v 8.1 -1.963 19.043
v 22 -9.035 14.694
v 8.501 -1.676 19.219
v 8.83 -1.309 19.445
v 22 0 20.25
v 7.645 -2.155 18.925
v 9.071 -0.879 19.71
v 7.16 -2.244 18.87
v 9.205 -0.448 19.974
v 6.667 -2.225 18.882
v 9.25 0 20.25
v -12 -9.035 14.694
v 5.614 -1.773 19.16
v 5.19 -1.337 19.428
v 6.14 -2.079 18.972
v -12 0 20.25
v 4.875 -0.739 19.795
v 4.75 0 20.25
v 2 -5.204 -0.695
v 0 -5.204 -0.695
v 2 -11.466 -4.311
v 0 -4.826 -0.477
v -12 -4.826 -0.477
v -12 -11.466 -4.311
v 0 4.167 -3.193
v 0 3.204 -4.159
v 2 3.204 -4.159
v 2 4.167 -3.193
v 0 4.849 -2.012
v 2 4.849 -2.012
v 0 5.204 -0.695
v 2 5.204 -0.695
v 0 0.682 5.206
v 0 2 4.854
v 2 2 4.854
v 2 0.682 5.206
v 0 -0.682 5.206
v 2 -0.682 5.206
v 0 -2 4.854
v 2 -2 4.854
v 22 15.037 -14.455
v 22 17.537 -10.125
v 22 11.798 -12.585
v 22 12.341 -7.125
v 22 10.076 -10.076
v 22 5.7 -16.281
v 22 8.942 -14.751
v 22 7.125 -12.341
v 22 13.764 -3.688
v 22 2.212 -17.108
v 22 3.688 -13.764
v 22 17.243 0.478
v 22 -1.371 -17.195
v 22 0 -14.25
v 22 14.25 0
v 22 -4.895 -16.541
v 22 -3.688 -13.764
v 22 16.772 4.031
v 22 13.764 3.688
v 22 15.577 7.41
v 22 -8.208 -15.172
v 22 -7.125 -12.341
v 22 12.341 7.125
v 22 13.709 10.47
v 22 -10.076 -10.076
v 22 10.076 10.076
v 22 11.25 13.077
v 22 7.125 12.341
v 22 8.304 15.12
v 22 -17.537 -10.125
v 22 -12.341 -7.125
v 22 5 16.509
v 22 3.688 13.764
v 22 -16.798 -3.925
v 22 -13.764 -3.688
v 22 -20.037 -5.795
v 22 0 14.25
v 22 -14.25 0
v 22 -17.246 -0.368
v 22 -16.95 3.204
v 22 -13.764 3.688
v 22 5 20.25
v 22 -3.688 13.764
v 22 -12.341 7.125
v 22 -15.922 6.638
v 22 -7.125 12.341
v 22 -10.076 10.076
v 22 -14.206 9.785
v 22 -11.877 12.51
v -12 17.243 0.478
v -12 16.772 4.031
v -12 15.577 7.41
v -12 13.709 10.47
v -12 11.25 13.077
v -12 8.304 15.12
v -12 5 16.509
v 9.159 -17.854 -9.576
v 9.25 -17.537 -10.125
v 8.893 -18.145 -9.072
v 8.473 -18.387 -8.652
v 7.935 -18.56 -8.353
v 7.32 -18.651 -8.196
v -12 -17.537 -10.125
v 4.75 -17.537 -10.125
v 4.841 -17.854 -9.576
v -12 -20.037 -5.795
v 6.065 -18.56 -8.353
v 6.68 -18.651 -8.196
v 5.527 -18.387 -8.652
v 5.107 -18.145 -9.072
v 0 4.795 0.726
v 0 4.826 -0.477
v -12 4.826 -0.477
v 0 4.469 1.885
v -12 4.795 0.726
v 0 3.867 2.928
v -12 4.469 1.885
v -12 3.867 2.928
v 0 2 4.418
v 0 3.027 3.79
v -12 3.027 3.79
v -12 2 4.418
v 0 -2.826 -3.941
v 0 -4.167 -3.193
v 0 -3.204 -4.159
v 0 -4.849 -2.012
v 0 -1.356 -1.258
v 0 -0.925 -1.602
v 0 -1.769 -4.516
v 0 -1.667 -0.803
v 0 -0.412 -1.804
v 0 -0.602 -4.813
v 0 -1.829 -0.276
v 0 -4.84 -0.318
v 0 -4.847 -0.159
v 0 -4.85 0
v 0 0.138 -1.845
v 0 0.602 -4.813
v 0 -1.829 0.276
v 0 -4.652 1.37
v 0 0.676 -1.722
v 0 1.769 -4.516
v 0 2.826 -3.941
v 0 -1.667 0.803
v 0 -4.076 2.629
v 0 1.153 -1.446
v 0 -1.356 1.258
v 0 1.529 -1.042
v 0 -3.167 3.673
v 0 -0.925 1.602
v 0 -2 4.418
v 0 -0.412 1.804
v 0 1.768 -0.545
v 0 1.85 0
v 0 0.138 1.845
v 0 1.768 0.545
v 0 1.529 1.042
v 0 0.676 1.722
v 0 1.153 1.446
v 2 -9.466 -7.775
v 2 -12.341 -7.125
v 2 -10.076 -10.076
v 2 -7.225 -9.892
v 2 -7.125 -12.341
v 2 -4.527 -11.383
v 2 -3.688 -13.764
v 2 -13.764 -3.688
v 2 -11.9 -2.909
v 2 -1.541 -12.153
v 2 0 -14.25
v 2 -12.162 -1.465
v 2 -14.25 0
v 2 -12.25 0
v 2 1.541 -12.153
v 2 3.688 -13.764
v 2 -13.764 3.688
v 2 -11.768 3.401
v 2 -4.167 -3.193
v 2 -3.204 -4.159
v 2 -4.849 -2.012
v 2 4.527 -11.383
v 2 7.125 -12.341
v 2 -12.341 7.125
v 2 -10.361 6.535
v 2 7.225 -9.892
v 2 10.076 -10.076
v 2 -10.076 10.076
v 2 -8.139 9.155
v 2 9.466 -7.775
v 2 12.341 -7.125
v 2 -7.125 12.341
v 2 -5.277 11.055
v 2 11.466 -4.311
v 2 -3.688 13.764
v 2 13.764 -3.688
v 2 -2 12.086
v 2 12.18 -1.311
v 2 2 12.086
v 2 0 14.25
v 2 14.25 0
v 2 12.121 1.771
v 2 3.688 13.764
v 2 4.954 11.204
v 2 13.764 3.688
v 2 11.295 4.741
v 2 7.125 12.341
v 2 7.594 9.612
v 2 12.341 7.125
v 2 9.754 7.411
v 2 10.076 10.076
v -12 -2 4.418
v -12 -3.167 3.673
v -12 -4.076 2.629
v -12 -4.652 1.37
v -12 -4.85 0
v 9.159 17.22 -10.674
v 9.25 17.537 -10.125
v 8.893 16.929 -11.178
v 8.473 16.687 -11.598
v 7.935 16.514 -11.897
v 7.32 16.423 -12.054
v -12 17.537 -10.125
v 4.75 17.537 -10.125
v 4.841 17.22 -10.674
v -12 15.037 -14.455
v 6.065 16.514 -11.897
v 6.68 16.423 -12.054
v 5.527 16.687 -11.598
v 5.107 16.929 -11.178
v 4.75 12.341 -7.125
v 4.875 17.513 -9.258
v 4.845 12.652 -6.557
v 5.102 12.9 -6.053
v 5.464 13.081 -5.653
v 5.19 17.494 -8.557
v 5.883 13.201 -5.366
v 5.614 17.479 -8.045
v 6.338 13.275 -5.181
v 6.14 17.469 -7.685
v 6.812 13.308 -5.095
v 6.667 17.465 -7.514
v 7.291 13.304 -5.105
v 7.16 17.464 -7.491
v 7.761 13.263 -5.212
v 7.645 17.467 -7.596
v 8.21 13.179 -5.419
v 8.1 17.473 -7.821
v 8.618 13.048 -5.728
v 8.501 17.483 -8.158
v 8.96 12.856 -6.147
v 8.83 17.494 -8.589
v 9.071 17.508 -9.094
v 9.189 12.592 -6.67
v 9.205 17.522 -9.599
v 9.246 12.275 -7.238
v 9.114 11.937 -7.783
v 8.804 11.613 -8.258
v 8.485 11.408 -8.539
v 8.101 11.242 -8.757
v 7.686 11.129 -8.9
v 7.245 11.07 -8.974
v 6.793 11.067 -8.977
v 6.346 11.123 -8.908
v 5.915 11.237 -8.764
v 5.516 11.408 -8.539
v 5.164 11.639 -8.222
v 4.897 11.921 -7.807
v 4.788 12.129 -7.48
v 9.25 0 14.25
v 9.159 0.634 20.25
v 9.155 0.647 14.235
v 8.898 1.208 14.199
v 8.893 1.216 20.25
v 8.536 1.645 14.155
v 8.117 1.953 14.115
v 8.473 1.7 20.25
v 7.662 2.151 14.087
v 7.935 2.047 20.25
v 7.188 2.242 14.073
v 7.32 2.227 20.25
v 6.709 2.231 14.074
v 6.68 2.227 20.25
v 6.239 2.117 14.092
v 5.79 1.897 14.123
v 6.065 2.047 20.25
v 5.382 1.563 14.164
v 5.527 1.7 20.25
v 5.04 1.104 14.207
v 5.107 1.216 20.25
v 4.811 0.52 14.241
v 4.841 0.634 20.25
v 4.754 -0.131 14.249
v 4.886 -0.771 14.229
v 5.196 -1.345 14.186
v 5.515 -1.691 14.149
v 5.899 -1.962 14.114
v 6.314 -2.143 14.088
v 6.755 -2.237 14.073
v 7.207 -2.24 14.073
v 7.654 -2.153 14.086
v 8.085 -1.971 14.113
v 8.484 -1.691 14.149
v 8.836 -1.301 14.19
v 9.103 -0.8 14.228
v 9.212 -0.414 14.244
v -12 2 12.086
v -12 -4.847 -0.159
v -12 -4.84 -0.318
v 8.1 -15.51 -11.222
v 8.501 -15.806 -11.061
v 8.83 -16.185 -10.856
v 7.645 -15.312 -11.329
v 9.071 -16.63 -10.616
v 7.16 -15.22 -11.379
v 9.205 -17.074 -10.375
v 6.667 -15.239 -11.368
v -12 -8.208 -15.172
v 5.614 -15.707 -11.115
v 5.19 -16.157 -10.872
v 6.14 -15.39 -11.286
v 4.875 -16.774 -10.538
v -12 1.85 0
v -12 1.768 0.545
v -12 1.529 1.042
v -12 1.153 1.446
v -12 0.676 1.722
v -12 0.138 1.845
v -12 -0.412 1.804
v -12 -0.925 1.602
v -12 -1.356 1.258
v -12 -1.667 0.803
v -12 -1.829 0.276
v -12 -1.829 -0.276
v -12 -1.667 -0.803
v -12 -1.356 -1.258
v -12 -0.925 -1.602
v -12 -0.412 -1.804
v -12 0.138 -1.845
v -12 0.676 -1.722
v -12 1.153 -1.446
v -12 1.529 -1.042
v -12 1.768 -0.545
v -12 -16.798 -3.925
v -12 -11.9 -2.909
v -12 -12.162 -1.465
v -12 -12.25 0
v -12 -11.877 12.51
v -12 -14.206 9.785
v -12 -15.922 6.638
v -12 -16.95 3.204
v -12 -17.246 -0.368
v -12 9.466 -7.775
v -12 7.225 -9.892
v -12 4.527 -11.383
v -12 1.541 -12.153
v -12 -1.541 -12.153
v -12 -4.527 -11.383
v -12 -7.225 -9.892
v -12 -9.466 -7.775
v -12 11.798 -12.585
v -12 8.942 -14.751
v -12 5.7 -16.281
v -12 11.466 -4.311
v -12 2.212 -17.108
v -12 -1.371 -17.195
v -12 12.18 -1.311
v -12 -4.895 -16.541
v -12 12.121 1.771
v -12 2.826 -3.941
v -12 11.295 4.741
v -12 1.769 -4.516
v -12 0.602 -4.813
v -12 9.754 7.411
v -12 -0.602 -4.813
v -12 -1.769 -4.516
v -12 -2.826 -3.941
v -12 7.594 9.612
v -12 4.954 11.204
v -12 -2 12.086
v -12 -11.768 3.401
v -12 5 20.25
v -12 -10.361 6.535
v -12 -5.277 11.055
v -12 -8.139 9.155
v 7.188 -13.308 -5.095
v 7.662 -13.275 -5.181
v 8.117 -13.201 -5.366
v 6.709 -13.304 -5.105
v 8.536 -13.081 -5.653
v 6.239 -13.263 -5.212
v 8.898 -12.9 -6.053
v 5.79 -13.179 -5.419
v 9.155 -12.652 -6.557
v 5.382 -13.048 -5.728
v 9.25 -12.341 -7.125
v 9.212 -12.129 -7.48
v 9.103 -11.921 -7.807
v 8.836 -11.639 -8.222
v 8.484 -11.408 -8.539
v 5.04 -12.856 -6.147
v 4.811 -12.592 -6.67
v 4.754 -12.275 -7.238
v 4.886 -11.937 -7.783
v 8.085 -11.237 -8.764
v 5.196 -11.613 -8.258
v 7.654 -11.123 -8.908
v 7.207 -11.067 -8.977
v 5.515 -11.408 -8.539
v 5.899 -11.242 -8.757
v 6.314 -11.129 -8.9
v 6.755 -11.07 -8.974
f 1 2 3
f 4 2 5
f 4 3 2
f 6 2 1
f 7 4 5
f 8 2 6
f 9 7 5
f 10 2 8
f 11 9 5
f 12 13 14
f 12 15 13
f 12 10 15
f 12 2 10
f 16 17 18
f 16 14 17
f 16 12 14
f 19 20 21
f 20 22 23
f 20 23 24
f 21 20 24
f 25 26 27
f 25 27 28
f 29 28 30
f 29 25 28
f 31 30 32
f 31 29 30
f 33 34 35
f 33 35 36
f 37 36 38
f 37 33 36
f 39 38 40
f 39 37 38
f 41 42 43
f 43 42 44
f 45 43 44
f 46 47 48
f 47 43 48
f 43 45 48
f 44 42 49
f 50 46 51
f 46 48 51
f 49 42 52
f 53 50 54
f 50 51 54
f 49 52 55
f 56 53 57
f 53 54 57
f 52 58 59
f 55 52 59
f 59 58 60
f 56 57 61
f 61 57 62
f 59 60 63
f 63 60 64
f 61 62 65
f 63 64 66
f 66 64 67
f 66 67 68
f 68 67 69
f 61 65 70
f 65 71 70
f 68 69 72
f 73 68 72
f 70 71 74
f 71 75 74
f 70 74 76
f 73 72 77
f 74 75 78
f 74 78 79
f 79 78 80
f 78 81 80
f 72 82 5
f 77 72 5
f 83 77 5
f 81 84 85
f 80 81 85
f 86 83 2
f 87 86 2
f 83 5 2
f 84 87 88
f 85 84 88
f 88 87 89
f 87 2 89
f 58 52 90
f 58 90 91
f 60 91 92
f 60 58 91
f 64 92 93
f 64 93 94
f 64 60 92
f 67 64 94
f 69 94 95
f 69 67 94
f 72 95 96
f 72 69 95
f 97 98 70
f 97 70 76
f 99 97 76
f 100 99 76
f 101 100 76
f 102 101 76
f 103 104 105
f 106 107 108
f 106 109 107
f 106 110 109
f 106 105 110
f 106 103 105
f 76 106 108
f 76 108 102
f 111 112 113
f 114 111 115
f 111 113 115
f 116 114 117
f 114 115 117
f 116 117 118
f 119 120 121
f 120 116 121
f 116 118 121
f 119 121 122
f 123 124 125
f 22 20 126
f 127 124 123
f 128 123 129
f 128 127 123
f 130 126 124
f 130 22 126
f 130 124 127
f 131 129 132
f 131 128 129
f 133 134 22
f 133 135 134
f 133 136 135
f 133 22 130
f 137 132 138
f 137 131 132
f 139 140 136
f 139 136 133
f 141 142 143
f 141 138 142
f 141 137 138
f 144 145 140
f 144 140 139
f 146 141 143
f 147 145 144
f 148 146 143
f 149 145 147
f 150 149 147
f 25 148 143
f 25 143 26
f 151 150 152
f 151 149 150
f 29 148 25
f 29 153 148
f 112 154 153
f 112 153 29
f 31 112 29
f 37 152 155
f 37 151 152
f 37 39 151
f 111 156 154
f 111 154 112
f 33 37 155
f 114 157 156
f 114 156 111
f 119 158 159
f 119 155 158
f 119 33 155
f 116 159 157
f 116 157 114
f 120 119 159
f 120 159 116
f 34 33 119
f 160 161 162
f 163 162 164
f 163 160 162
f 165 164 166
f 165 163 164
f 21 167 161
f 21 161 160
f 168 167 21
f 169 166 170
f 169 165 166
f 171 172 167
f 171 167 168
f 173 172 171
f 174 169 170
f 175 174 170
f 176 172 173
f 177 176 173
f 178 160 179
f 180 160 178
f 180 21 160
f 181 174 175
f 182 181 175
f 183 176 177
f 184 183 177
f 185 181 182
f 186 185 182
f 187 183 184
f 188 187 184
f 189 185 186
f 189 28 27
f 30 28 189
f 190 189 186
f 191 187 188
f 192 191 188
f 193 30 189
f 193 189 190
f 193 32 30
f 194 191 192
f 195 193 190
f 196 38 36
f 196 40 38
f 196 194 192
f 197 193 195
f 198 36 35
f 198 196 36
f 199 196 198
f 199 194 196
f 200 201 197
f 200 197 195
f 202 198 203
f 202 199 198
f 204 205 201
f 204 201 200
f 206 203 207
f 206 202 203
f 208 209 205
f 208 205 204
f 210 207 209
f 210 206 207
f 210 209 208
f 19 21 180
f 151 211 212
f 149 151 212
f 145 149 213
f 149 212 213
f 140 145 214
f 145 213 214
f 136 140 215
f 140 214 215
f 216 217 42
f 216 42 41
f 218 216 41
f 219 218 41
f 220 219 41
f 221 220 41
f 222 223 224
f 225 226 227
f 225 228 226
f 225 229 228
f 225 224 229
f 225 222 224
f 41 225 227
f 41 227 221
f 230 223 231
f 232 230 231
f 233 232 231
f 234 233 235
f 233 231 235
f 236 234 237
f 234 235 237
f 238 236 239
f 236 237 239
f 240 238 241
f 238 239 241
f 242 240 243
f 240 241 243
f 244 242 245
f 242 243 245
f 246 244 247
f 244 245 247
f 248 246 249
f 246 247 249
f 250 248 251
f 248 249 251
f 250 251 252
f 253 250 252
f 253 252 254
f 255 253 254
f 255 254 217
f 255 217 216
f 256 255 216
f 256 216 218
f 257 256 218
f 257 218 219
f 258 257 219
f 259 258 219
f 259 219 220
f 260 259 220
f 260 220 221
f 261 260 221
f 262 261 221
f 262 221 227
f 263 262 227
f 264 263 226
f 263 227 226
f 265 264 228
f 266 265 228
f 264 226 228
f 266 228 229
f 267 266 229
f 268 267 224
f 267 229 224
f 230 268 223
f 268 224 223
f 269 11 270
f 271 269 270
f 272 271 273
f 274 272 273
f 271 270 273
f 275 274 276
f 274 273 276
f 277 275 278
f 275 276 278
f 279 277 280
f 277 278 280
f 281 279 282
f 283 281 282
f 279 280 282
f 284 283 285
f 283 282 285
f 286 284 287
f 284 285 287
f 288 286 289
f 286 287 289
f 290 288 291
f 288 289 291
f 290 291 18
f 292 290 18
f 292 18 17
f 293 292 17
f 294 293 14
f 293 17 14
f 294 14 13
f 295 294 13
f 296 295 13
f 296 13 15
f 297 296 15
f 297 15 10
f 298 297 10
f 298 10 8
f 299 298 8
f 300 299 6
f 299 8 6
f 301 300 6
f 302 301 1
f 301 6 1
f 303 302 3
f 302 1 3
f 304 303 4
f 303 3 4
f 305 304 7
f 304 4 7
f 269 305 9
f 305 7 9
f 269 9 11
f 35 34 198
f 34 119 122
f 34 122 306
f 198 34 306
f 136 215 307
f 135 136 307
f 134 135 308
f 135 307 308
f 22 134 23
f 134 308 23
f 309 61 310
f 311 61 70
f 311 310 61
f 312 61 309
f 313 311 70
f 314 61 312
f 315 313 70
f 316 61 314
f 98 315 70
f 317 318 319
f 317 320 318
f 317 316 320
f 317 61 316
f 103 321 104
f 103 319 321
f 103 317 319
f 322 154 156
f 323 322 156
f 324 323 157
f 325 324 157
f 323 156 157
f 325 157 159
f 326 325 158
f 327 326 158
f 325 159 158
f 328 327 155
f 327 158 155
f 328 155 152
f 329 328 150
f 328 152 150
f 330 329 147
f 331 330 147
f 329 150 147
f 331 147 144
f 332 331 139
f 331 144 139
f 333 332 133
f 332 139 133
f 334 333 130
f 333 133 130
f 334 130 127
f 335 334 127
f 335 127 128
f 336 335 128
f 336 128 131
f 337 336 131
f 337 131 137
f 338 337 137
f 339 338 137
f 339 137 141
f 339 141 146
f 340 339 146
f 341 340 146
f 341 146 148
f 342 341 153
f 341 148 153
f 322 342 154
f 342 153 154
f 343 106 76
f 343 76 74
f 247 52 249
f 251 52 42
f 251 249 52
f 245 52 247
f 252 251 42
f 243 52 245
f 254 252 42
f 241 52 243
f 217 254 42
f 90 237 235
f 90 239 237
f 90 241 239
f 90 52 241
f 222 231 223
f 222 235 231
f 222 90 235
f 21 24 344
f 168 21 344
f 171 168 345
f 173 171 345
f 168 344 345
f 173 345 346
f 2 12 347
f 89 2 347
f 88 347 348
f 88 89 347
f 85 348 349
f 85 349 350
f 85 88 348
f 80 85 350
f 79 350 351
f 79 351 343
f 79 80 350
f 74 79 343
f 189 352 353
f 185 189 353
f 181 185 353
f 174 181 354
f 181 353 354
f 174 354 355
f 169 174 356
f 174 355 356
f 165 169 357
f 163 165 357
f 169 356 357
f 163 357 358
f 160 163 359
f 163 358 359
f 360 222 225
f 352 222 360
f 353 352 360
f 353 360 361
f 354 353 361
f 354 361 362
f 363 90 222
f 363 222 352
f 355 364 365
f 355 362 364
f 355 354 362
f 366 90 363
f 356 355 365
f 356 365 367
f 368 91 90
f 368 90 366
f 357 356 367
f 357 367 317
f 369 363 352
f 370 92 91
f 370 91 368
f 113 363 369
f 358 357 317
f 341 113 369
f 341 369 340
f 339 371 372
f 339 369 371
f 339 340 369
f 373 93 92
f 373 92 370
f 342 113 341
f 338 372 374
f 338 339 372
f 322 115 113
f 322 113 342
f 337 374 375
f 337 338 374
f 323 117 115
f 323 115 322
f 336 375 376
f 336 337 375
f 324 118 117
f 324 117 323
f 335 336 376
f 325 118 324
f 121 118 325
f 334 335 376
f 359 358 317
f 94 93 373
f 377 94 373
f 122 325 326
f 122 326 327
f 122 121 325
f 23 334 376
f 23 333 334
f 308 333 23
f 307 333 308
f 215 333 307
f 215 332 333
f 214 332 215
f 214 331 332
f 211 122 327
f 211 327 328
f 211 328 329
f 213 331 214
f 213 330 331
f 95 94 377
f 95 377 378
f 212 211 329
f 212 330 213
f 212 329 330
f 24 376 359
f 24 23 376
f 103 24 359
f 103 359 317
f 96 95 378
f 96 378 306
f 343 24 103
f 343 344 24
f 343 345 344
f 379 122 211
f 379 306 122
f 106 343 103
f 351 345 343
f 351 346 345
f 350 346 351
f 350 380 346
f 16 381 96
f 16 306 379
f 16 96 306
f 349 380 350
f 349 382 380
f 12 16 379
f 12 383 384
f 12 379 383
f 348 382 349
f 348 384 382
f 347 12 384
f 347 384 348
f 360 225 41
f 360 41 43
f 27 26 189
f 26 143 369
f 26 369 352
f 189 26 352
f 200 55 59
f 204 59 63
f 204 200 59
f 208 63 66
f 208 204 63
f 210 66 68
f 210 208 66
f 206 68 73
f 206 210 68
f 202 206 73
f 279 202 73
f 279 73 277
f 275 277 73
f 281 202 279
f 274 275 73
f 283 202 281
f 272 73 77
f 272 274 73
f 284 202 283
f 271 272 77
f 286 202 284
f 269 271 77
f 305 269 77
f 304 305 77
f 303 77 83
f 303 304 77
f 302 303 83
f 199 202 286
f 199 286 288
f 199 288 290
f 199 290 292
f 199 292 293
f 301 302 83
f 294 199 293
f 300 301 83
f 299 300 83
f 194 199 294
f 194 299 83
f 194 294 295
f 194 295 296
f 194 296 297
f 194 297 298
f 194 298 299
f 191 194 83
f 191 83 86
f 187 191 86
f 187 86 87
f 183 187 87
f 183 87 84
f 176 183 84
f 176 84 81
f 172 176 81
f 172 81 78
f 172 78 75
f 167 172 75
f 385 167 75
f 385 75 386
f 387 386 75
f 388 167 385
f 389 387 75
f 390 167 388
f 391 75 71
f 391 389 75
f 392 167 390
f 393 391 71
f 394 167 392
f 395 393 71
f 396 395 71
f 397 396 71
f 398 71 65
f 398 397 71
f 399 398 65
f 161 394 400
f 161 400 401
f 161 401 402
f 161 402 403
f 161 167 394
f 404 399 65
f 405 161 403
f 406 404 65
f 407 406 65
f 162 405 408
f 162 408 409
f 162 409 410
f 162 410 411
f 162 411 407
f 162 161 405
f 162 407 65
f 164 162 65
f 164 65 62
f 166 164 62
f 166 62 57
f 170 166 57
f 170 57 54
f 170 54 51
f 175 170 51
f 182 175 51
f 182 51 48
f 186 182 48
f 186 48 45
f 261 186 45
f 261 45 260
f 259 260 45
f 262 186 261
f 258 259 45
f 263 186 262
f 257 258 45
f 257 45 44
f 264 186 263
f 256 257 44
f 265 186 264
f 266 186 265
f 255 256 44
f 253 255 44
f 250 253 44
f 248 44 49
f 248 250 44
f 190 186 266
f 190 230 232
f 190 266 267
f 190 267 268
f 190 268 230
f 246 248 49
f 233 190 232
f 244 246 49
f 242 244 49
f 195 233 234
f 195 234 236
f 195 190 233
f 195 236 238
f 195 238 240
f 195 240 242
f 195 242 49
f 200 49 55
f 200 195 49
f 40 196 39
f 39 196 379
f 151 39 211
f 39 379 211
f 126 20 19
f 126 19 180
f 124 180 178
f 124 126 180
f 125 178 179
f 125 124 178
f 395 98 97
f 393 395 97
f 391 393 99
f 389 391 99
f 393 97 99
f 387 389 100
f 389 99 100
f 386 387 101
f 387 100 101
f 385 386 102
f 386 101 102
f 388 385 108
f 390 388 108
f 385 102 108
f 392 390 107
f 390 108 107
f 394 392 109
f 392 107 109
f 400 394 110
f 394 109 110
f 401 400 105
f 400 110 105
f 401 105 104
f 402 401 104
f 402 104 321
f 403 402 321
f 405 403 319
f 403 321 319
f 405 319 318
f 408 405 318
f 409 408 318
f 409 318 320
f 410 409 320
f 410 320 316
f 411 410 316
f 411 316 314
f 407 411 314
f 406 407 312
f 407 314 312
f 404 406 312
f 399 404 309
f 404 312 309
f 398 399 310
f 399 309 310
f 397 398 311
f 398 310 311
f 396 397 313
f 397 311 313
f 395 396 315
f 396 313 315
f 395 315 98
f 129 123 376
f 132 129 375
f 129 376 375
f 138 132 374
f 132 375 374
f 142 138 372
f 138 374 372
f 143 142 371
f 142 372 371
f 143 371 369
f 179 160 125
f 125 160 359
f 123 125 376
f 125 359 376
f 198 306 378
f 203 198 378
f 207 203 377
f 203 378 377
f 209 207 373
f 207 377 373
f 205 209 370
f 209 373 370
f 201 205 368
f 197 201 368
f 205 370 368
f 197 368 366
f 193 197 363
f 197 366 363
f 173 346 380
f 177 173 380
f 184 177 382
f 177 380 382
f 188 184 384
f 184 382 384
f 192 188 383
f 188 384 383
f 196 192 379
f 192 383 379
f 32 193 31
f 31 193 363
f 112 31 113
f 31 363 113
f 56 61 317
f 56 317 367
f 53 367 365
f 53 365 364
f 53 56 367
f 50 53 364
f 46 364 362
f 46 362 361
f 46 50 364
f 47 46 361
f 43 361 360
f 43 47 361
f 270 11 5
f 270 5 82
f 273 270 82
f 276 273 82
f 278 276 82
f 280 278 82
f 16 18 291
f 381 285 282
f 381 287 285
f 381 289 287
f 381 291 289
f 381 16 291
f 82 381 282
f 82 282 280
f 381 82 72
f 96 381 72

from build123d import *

# Parameters (mm, degrees)
F0_R      = 17.25
F0_R_2    = 14.25
F1_DEPTH  = 22
F0_R_3    = 5.25
F2_DEPTH  = 2
F0_R_4    = 1.85
F3_DEPTH  = 12
F5_DEPTH  = 34
F7_DEPTH  = 7.1787528205
F8_R      = 2.25
F10_DEPTH = 7.1787528205
F9_R      = 2.25
F11_DEPTH = 7.1787528205
F13_DEPTH = 25


with BuildPart() as f1:
    # F0 (on Right) → F1 (new body)
    with BuildSketch(Plane.YZ):
        Circle(F0_R)
        Circle(F0_R_2, mode=Mode.SUBTRACT)
    extrude(amount=F1_DEPTH)

    # F0 (on Right) → F2 (join)
    with BuildSketch(Plane.YZ):
        Circle(F0_R)
        Circle(F0_R_2, mode=Mode.SUBTRACT)
        Circle(F0_R_2)
        Circle(F0_R_3, mode=Mode.SUBTRACT)
    extrude(amount=F2_DEPTH)

    # F0 (on Right) → F3 (join)
    with BuildSketch(Plane.YZ):
        Circle(F0_R)
        Circle(F0_R_2, mode=Mode.SUBTRACT)
        Circle(F0_R_2)
        Circle(F0_R_3, mode=Mode.SUBTRACT)
        Circle(F0_R_3)
        Circle(F0_R_4, mode=Mode.SUBTRACT)
    extrude(amount=-F3_DEPTH)

    # F4 (on face) → F5 (join, through all)
    with BuildSketch(Plane(origin=(-12, 0, 0), x_dir=(0, -1, 0), z_dir=(-1, 0, 0))):
        with BuildLine():
            Line((-5, 20.25), (-5, 16.5094669811))
            ThreePointArc((-5, 16.5094669811), (2.2123277405, 17.1075452935), (9.0352533152, 14.6944444444))
            Line((9.0352533152, 14.6944444444), (0, 20.25))
            Line((0, 20.25), (-5, 20.25))
        make_face()
        with BuildLine():
            Line((-15.0370144266, -14.4551270189), (-11.7976178086, -12.5848605095))
            ThreePointArc((-11.7976178086, -12.5848605095), (-15.9217326908, -6.6378406219), (-17.243388841, 0.4775366783))
            Line((-17.243388841, 0.4775366783), (-17.5370144266, -10.125))
            Line((-17.5370144266, -10.125), (-15.0370144266, -14.4551270189))
        make_face()
        with BuildLine():
            Line((20.0370144266, -5.7948729811), (16.7976178086, -3.9246064716))
            ThreePointArc((16.7976178086, -3.9246064716), (13.7094049503, -10.4697046715), (8.2081355258, -15.1719811228))
            Line((8.2081355258, -15.1719811228), (17.5370144266, -10.125))
            Line((17.5370144266, -10.125), (20.0370144266, -5.7948729811))
        make_face()
    extrude(amount=-F5_DEPTH)

    # F6 (on face) → F7 (cut, up to face)
    with BuildSketch(Plane.XY.offset(20.25)):
        with BuildLine():
            ThreePointArc((4.75, 0), (7, -2.25), (9.25, 0))
            Line((9.25, 0), (4.75, 0))
        make_face()
        with BuildLine():
            Line((4.75, 0), (9.25, 0))
            ThreePointArc((9.25, 0), (7, 2.25), (4.75, 0))
        make_face()
    extrude(amount=-F7_DEPTH, mode=Mode.SUBTRACT)

    # F8 (on face) → F10 (cut, up to face)
    with BuildSketch(Plane(origin=(0, 17.5370144266, -10.125), x_dir=(-1, 0, 0), z_dir=(0, 0.8660254038, -0.5))):
        with Locations((-7, 0)):
            Circle(F8_R)
    extrude(amount=-F10_DEPTH, mode=Mode.SUBTRACT)

    # F9 (on face) → F11 (cut, up to face)
    with BuildSketch(Plane(origin=(0, -17.5370144266, -10.125), x_dir=(1, 0, 0), z_dir=(0, -0.8660254038, -0.5))):
        with Locations((7, 0)):
            Circle(F9_R)
    extrude(amount=-F11_DEPTH, mode=Mode.SUBTRACT)

    # F12 (on face) → F13 (cut)
    with BuildSketch(Plane(origin=(-12, 0, 0), x_dir=(0, -1, 0), z_dir=(-1, 0, 0))):
        with BuildLine():
            ThreePointArc((-4.8264703056, -0.4771628534), (-4.2002232084, 2.425), (-2, 4.418427322))
            Line((-2, 4.418427322), (-2, 12.0856319653))
            ThreePointArc((-2, 12.0856319653), (-10.6088111964, 6.125), (-11.4664643027, -4.3107651751))
            Line((-11.4664643027, -4.3107651751), (-4.8264703056, -0.4771628534))
        make_face()
        with BuildLine():
            ThreePointArc((2, 4.418427322), (4.0756901256, 2.6289256361), (4.85, 0))
            ThreePointArc((4.85, 0), (4.8441140048, -0.2388713227), (4.8264703056, -0.4771628534))
            Line((4.8264703056, -0.4771628534), (11.4664643027, -4.3107651751))
            ThreePointArc((11.4664643027, -4.3107651751), (12.0525243768, -2.1906976391), (12.25, 0))
            ThreePointArc((12.25, 0), (9.3424434705, 7.9234619959), (2, 12.0856319653))
            Line((2, 12.0856319653), (2, 4.418427322))
        make_face()
        with BuildLine():
            Line((9.4664643027, -7.7748667902), (2.8264703056, -3.9412644686))
            ThreePointArc((2.8264703056, -3.9412644686), (0, -4.85), (-2.8264703056, -3.9412644686))
            Line((-2.8264703056, -3.9412644686), (-9.4664643027, -7.7748667902))
            ThreePointArc((-9.4664643027, -7.7748667902), (0, -12.25), (9.4664643027, -7.7748667902))
        make_face()
    extrude(amount=-F13_DEPTH, mode=Mode.SUBTRACT)


solid = f1.part
